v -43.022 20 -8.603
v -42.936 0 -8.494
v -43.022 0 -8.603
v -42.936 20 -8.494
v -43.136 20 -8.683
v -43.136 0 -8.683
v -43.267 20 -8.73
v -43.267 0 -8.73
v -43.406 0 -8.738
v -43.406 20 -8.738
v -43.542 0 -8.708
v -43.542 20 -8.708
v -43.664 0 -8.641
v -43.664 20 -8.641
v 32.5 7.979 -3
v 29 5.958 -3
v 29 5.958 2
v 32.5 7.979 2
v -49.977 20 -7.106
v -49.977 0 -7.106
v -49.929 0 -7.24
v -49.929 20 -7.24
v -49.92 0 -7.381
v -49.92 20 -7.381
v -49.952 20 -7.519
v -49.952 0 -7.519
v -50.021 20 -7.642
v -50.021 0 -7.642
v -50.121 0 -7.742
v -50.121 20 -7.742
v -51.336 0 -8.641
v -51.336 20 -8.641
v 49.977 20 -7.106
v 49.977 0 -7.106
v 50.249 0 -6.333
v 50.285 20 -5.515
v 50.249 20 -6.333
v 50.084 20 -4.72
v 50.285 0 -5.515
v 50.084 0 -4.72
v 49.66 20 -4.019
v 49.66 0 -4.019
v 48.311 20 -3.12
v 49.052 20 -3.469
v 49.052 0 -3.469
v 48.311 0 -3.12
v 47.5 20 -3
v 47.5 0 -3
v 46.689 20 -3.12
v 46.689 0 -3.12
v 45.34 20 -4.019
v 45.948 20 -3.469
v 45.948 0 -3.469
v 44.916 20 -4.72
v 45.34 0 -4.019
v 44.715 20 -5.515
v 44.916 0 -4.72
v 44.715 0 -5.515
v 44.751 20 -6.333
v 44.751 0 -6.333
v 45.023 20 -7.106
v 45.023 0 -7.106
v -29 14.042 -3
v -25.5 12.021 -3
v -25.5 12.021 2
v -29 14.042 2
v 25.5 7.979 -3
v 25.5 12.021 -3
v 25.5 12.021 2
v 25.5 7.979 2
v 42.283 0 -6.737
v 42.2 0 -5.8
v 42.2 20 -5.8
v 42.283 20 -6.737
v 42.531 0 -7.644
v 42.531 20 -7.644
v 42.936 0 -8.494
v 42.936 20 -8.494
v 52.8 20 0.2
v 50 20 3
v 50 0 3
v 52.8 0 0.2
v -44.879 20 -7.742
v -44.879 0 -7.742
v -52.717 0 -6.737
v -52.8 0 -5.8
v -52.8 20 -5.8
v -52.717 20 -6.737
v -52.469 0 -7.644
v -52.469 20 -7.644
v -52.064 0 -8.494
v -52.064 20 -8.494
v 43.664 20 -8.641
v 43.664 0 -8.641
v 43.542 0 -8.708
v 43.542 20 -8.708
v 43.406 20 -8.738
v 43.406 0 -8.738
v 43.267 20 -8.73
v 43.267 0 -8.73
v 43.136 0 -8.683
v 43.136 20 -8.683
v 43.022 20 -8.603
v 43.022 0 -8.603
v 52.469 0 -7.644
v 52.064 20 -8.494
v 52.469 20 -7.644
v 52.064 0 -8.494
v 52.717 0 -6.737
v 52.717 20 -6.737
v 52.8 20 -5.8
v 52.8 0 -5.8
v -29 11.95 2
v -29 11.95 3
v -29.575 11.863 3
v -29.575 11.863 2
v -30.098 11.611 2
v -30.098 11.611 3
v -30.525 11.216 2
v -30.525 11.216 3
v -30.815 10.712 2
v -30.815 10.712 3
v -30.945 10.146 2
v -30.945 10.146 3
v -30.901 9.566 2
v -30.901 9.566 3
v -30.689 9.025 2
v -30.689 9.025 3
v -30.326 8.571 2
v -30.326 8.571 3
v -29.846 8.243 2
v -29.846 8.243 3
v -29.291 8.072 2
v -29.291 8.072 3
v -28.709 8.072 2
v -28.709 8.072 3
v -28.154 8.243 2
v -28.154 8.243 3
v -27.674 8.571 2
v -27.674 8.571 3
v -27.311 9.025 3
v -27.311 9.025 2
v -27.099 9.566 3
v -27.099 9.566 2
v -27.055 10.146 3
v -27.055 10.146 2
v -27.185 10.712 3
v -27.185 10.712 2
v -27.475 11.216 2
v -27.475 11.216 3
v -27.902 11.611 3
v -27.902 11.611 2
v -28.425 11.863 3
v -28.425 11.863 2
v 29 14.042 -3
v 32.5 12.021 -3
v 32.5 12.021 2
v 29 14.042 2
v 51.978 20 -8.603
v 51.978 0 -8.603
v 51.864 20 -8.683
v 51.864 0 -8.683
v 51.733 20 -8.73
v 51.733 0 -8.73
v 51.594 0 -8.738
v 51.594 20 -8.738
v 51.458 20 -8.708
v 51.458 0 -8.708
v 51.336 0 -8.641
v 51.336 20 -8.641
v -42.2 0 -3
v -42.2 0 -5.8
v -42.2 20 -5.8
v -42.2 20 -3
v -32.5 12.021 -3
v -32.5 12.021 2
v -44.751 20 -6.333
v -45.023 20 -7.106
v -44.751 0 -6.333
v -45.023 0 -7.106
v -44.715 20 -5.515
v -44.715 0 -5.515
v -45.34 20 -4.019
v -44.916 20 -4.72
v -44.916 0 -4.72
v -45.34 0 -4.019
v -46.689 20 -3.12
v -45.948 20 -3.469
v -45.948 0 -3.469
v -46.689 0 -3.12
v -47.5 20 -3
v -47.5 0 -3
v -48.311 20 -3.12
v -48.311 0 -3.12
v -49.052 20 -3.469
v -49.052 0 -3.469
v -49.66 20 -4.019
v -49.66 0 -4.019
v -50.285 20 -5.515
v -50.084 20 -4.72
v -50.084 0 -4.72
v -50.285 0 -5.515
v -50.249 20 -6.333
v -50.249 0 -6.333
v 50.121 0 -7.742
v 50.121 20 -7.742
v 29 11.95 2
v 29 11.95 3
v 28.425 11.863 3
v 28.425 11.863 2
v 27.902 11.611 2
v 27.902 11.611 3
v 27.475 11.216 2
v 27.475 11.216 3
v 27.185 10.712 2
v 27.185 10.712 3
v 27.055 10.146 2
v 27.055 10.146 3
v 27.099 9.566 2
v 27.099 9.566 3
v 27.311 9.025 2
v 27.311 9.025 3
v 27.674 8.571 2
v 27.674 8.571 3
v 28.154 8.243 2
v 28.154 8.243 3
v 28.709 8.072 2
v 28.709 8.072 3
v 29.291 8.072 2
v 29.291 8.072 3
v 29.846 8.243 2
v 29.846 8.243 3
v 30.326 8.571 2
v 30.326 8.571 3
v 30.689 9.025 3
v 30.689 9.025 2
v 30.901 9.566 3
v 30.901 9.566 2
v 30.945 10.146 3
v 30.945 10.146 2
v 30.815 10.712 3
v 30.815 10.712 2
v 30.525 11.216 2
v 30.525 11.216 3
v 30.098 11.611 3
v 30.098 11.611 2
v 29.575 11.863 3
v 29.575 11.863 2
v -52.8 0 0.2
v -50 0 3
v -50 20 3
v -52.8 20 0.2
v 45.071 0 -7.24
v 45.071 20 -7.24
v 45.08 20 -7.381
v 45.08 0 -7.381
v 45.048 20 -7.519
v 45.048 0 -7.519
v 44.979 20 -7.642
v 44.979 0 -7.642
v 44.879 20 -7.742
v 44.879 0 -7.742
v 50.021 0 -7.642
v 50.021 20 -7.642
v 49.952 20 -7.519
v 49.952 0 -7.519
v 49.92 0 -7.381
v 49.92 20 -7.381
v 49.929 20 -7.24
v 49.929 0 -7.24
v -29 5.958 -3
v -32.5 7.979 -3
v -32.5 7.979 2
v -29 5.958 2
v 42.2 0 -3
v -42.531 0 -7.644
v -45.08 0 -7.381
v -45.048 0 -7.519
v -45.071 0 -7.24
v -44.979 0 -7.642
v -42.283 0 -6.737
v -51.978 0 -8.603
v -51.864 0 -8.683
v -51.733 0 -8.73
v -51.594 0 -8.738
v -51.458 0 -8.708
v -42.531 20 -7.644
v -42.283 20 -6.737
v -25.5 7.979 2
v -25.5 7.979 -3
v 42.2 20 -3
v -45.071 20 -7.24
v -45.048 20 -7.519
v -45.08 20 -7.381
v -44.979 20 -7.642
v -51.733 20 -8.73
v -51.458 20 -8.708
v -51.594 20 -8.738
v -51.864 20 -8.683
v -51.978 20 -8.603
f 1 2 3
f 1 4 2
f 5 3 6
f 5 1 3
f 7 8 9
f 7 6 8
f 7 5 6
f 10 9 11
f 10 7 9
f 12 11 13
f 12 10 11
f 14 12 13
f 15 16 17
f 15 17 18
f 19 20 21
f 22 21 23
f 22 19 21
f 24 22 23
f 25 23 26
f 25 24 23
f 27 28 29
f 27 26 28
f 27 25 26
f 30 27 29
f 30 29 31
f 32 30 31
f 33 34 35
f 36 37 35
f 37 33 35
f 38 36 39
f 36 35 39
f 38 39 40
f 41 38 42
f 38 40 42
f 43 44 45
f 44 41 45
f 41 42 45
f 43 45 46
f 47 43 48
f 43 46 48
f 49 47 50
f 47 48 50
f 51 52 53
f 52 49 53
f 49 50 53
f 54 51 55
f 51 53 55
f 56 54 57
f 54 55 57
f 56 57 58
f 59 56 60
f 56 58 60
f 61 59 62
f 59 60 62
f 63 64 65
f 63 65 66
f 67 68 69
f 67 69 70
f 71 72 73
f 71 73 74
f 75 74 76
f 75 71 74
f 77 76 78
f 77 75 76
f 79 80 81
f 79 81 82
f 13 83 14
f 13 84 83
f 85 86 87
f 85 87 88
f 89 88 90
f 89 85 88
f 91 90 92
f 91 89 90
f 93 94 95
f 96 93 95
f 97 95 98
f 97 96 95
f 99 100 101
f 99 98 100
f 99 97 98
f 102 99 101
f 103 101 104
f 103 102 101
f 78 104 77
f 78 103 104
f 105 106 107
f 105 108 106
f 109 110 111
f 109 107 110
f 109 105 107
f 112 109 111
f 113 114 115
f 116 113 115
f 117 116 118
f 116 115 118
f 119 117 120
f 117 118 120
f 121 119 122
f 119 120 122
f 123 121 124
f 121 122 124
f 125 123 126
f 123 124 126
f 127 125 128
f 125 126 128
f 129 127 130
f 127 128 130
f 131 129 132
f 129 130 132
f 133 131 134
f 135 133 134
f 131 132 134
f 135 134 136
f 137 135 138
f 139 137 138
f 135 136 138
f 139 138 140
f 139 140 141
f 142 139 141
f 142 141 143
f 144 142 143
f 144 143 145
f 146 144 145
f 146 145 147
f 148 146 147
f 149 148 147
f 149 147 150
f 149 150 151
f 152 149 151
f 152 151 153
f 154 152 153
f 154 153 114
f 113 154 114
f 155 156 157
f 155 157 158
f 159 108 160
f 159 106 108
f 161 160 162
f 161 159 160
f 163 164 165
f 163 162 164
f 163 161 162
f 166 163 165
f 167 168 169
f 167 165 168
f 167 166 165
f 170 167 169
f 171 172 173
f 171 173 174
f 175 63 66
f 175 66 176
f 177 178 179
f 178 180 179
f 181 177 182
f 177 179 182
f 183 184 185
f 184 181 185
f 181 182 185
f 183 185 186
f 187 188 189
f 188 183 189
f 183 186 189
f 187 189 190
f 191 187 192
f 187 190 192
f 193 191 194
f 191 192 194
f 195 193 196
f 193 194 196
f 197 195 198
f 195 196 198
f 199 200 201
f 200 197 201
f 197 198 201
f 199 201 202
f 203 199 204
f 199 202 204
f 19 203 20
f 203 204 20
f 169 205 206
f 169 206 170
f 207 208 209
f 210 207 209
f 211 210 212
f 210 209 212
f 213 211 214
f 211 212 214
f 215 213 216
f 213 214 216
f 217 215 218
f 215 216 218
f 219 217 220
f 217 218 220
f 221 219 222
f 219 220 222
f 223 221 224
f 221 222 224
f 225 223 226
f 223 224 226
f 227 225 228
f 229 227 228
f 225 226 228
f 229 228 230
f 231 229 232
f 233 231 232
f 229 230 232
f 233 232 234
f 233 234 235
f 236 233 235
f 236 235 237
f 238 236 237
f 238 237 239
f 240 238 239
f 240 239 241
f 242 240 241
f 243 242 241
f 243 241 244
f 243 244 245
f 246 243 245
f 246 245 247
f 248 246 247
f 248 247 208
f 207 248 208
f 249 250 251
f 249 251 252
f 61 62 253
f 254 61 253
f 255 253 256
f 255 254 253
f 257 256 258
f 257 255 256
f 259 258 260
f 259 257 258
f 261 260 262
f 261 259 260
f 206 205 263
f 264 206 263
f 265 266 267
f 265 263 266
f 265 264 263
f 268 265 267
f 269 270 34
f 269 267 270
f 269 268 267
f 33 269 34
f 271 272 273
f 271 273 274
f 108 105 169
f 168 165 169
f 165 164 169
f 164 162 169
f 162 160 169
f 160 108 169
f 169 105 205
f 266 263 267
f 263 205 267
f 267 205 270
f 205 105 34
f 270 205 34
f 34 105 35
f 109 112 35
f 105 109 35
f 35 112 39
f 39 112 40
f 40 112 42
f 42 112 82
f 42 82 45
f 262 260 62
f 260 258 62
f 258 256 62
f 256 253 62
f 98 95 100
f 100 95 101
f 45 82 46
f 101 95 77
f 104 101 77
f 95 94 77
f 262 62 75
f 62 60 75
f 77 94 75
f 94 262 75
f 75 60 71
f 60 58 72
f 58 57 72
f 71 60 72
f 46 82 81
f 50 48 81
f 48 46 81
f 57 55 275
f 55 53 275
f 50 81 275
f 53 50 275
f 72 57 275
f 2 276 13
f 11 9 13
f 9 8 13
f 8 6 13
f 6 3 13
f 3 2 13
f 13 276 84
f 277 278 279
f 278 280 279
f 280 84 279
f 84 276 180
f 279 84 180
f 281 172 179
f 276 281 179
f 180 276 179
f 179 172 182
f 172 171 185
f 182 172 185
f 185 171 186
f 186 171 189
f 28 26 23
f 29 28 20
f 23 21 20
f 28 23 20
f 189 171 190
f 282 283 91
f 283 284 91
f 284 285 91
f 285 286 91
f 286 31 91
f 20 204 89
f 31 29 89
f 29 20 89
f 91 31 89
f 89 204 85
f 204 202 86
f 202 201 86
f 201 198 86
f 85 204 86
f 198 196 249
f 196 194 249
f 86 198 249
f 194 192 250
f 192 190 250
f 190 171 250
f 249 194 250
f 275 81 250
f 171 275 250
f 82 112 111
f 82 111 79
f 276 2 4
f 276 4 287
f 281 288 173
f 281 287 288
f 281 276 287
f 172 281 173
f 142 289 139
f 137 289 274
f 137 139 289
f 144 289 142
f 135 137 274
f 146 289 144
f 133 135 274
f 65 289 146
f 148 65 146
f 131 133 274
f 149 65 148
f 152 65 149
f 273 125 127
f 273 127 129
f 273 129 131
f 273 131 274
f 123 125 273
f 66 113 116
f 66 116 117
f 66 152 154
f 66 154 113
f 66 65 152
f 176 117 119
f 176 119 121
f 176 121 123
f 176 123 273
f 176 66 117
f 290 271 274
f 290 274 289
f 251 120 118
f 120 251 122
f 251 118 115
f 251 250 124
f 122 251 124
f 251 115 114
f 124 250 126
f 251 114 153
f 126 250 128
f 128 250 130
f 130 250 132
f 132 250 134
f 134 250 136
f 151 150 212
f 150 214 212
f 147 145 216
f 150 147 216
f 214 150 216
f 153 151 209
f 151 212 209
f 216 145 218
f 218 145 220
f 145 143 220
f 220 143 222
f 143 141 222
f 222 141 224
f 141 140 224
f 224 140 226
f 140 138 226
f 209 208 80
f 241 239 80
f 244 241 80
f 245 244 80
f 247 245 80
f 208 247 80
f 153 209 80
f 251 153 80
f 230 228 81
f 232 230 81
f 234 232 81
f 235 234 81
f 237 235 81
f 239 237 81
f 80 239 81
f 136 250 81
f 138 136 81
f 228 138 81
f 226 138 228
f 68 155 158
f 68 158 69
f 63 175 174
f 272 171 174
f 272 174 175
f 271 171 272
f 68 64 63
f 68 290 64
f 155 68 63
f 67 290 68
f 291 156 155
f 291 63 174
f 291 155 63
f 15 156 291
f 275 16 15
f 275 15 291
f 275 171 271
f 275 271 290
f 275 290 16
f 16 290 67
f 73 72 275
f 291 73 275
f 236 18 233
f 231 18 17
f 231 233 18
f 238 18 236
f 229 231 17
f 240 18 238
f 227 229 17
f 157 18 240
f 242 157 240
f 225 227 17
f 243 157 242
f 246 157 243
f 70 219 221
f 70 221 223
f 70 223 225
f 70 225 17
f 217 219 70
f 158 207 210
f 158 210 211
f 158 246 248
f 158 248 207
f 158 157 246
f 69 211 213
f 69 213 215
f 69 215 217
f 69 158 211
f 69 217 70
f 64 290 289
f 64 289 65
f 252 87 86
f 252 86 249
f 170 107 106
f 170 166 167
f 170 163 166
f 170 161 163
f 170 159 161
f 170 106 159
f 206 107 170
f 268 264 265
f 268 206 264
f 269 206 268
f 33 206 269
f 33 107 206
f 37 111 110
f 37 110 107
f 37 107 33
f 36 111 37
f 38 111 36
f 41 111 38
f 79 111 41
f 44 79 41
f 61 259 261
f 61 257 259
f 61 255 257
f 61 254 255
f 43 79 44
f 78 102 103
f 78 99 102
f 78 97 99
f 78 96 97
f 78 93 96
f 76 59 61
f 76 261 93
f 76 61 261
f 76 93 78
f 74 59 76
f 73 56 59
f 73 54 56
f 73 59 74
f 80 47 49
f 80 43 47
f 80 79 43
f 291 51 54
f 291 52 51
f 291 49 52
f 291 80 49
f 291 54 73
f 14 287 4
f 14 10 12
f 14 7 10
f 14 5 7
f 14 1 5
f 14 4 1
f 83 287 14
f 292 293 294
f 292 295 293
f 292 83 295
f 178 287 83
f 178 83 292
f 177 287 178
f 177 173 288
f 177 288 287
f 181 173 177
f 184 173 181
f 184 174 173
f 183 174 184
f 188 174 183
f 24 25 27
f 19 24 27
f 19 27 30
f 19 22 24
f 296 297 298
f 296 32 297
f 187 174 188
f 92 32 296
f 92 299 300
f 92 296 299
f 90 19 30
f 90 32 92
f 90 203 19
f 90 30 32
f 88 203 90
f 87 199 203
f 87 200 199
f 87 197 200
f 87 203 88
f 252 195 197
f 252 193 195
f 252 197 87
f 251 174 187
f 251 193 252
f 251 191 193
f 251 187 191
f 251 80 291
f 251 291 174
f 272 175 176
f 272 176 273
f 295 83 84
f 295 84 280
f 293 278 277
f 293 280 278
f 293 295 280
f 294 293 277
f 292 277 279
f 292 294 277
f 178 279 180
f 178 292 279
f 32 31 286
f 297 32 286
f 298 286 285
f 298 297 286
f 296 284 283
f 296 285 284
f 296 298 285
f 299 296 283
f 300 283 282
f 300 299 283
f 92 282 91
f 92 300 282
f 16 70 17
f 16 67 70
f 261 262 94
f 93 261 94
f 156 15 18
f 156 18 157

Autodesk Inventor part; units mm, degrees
ref_plane "YZ Plane" through (0, 0, 0) normal (1, 0, 0) x (0, 1, 0)
ref_plane "XZ Plane" through (0, 0, 0) normal (0, 1, 0) x (-1, 0, 0)
ref_plane "XY Plane" through (0, 0, 0) normal (0, 0, 1) x (1, 0, 0)
sketch "Sketch1" plane through (0, 0, 0) normal (0, 1, 0) x (-1, 0, 0)
  line L0 (52.8, -3) -> (-52.8, -3) construction
  line L1 (-52.8, -3) -> (-52.8, 3)
  line L2 (-52.8, 3) -> (52.8, 3) construction
  line L3 (52.8, 3) -> (52.8, -3)
  circle A0 centre (47.5, -5.8) radius 2.8 construction
  circle A1 centre (-47.5, -5.8) radius 2.8 construction
  line L4 (50.3, -5.8) -> (50.3, -3) construction
  line L5 (44.7, -5.8) -> (44.7, -3) construction
  circle A2 centre (47.5, -5.8) radius 5.3 construction
  line L6 (52.8, -5.8) -> (52.8, -3)
  line L7 (42.2, -5.8) -> (42.2, -3)
  arc A3 (51.7589, -8.9546) -> (52.8, -5.8) centre (47.5, -5.8) ccw
  arc A4 (42.2, -5.8) -> (43.2411, -8.9546) centre (47.5, -5.8) ccw
  circle A5 centre (-47.5, -5.8) radius 5.3 construction
  line L8 (0, -3) -> (0, 3) construction
  line L9 (47.5, -5.8) -> (47.5, -3) construction
  line L10 (-47.5, -5.8) -> (-47.5, -3) construction
  line L11 (-42.2, -5.8) -> (-42.2, -3)
  line L12 (-52.8, -5.8) -> (-52.8, -3)
  arc A6 (-43.2411, -8.9546) -> (-42.2, -5.8) centre (-47.5, -5.8) ccw
  arc A7 (-52.8, -5.8) -> (-51.7589, -8.9546) centre (-47.5, -5.8) ccw
  line L13 (42.2, -3) -> (-42.2, -3)
  arc A8 (49.75, -7.4666) -> (45.25, -7.4666) centre (47.5, -5.8) ccw
  line L14 (49.75, -7.4666) -> (51.7589, -8.9546)
  line L15 (45.25, -7.4666) -> (43.2411, -8.9546)
  arc A9 (-45.25, -7.4666) -> (-49.75, -7.4666) centre (-47.5, -5.8) ccw
  line L16 (-45.25, -7.4666) -> (-43.2411, -8.9546)
  line L17 (-49.75, -7.4666) -> (-51.7589, -8.9546)
  line L18 (50, 3) -> (-50, 3)
  line L19 (-50, 3) -> (-52.8, 0.2)
  line L20 (50, 3) -> (52.8, 0.2)
  point P0 (0, 0)
  point P1 (0, 0)
  point P2 (47.5, -3)
  point P3 (-53.25, -3)
  dimension "d0" = 95
  dimension "d1" = 2.5
  dimension "d4" = 6
  dimension "d5" = 6
  dimension "d20" = 5.6
  dimension "d21" = 4.5
  dimension "d22" = 100
extrude "Extrusion1" add sketch "Sketch1" along normal blind 20
fillet "Fillet1" radius 0.5 8 edges at (45.25, 10, -7.4666) (43.2411, 10, -8.9546) (51.7589, 10, -8.9546) (49.75, 10, -7.4666) (-51.7589, 10, -8.9546) (-49.75, 10, -7.4666) (-43.2411, 10, -8.9546) (-45.25, 10, -7.4666)
sketch "Sketch2" plane through (42.2, 0, -3) normal (0, 0, -1) x (-1, 0, 0)
  line L0 (0, 0) -> (84.4, 0) construction
  line L1 (0, 20) -> (84.4, 20) construction
  line L2 (42.2, 20) -> (42.2, 0) construction
  line L3 (13.2, 10) -> (71.2, 10) construction
  line L4 (9.7, 12.0207) -> (13.2, 14.0415)
  line L5 (13.2, 14.0415) -> (16.7, 12.0207)
  line L6 (16.7, 12.0207) -> (16.7, 7.9793)
  line L7 (16.7, 7.9793) -> (13.2, 5.9585)
  line L8 (13.2, 5.9585) -> (9.7, 7.9793)
  line L9 (9.7, 7.9793) -> (9.7, 12.0207)
  line L10 (74.7, 12.0207) -> (74.7, 7.9793)
  line L11 (74.7, 7.9793) -> (71.2, 5.9585)
  line L12 (71.2, 5.9585) -> (67.7, 7.9793)
  line L13 (67.7, 7.9793) -> (67.7, 12.0207)
  line L14 (67.7, 12.0207) -> (71.2, 14.0415)
  line L15 (71.2, 14.0415) -> (74.7, 12.0207)
  point P0 (42.2, 10)
  point P1 (42.2, 10)
  dimension "d9" = 58
  dimension "d10" = 7
extrude "Extrusion2" cut sketch "Sketch2" against normal blind 5
hole "Hole1" at (29, 10, -3) at (-29, 10, -3) direction (0, 0, 1) diameter 3.9 end through all
properties part number "switch_mount"
